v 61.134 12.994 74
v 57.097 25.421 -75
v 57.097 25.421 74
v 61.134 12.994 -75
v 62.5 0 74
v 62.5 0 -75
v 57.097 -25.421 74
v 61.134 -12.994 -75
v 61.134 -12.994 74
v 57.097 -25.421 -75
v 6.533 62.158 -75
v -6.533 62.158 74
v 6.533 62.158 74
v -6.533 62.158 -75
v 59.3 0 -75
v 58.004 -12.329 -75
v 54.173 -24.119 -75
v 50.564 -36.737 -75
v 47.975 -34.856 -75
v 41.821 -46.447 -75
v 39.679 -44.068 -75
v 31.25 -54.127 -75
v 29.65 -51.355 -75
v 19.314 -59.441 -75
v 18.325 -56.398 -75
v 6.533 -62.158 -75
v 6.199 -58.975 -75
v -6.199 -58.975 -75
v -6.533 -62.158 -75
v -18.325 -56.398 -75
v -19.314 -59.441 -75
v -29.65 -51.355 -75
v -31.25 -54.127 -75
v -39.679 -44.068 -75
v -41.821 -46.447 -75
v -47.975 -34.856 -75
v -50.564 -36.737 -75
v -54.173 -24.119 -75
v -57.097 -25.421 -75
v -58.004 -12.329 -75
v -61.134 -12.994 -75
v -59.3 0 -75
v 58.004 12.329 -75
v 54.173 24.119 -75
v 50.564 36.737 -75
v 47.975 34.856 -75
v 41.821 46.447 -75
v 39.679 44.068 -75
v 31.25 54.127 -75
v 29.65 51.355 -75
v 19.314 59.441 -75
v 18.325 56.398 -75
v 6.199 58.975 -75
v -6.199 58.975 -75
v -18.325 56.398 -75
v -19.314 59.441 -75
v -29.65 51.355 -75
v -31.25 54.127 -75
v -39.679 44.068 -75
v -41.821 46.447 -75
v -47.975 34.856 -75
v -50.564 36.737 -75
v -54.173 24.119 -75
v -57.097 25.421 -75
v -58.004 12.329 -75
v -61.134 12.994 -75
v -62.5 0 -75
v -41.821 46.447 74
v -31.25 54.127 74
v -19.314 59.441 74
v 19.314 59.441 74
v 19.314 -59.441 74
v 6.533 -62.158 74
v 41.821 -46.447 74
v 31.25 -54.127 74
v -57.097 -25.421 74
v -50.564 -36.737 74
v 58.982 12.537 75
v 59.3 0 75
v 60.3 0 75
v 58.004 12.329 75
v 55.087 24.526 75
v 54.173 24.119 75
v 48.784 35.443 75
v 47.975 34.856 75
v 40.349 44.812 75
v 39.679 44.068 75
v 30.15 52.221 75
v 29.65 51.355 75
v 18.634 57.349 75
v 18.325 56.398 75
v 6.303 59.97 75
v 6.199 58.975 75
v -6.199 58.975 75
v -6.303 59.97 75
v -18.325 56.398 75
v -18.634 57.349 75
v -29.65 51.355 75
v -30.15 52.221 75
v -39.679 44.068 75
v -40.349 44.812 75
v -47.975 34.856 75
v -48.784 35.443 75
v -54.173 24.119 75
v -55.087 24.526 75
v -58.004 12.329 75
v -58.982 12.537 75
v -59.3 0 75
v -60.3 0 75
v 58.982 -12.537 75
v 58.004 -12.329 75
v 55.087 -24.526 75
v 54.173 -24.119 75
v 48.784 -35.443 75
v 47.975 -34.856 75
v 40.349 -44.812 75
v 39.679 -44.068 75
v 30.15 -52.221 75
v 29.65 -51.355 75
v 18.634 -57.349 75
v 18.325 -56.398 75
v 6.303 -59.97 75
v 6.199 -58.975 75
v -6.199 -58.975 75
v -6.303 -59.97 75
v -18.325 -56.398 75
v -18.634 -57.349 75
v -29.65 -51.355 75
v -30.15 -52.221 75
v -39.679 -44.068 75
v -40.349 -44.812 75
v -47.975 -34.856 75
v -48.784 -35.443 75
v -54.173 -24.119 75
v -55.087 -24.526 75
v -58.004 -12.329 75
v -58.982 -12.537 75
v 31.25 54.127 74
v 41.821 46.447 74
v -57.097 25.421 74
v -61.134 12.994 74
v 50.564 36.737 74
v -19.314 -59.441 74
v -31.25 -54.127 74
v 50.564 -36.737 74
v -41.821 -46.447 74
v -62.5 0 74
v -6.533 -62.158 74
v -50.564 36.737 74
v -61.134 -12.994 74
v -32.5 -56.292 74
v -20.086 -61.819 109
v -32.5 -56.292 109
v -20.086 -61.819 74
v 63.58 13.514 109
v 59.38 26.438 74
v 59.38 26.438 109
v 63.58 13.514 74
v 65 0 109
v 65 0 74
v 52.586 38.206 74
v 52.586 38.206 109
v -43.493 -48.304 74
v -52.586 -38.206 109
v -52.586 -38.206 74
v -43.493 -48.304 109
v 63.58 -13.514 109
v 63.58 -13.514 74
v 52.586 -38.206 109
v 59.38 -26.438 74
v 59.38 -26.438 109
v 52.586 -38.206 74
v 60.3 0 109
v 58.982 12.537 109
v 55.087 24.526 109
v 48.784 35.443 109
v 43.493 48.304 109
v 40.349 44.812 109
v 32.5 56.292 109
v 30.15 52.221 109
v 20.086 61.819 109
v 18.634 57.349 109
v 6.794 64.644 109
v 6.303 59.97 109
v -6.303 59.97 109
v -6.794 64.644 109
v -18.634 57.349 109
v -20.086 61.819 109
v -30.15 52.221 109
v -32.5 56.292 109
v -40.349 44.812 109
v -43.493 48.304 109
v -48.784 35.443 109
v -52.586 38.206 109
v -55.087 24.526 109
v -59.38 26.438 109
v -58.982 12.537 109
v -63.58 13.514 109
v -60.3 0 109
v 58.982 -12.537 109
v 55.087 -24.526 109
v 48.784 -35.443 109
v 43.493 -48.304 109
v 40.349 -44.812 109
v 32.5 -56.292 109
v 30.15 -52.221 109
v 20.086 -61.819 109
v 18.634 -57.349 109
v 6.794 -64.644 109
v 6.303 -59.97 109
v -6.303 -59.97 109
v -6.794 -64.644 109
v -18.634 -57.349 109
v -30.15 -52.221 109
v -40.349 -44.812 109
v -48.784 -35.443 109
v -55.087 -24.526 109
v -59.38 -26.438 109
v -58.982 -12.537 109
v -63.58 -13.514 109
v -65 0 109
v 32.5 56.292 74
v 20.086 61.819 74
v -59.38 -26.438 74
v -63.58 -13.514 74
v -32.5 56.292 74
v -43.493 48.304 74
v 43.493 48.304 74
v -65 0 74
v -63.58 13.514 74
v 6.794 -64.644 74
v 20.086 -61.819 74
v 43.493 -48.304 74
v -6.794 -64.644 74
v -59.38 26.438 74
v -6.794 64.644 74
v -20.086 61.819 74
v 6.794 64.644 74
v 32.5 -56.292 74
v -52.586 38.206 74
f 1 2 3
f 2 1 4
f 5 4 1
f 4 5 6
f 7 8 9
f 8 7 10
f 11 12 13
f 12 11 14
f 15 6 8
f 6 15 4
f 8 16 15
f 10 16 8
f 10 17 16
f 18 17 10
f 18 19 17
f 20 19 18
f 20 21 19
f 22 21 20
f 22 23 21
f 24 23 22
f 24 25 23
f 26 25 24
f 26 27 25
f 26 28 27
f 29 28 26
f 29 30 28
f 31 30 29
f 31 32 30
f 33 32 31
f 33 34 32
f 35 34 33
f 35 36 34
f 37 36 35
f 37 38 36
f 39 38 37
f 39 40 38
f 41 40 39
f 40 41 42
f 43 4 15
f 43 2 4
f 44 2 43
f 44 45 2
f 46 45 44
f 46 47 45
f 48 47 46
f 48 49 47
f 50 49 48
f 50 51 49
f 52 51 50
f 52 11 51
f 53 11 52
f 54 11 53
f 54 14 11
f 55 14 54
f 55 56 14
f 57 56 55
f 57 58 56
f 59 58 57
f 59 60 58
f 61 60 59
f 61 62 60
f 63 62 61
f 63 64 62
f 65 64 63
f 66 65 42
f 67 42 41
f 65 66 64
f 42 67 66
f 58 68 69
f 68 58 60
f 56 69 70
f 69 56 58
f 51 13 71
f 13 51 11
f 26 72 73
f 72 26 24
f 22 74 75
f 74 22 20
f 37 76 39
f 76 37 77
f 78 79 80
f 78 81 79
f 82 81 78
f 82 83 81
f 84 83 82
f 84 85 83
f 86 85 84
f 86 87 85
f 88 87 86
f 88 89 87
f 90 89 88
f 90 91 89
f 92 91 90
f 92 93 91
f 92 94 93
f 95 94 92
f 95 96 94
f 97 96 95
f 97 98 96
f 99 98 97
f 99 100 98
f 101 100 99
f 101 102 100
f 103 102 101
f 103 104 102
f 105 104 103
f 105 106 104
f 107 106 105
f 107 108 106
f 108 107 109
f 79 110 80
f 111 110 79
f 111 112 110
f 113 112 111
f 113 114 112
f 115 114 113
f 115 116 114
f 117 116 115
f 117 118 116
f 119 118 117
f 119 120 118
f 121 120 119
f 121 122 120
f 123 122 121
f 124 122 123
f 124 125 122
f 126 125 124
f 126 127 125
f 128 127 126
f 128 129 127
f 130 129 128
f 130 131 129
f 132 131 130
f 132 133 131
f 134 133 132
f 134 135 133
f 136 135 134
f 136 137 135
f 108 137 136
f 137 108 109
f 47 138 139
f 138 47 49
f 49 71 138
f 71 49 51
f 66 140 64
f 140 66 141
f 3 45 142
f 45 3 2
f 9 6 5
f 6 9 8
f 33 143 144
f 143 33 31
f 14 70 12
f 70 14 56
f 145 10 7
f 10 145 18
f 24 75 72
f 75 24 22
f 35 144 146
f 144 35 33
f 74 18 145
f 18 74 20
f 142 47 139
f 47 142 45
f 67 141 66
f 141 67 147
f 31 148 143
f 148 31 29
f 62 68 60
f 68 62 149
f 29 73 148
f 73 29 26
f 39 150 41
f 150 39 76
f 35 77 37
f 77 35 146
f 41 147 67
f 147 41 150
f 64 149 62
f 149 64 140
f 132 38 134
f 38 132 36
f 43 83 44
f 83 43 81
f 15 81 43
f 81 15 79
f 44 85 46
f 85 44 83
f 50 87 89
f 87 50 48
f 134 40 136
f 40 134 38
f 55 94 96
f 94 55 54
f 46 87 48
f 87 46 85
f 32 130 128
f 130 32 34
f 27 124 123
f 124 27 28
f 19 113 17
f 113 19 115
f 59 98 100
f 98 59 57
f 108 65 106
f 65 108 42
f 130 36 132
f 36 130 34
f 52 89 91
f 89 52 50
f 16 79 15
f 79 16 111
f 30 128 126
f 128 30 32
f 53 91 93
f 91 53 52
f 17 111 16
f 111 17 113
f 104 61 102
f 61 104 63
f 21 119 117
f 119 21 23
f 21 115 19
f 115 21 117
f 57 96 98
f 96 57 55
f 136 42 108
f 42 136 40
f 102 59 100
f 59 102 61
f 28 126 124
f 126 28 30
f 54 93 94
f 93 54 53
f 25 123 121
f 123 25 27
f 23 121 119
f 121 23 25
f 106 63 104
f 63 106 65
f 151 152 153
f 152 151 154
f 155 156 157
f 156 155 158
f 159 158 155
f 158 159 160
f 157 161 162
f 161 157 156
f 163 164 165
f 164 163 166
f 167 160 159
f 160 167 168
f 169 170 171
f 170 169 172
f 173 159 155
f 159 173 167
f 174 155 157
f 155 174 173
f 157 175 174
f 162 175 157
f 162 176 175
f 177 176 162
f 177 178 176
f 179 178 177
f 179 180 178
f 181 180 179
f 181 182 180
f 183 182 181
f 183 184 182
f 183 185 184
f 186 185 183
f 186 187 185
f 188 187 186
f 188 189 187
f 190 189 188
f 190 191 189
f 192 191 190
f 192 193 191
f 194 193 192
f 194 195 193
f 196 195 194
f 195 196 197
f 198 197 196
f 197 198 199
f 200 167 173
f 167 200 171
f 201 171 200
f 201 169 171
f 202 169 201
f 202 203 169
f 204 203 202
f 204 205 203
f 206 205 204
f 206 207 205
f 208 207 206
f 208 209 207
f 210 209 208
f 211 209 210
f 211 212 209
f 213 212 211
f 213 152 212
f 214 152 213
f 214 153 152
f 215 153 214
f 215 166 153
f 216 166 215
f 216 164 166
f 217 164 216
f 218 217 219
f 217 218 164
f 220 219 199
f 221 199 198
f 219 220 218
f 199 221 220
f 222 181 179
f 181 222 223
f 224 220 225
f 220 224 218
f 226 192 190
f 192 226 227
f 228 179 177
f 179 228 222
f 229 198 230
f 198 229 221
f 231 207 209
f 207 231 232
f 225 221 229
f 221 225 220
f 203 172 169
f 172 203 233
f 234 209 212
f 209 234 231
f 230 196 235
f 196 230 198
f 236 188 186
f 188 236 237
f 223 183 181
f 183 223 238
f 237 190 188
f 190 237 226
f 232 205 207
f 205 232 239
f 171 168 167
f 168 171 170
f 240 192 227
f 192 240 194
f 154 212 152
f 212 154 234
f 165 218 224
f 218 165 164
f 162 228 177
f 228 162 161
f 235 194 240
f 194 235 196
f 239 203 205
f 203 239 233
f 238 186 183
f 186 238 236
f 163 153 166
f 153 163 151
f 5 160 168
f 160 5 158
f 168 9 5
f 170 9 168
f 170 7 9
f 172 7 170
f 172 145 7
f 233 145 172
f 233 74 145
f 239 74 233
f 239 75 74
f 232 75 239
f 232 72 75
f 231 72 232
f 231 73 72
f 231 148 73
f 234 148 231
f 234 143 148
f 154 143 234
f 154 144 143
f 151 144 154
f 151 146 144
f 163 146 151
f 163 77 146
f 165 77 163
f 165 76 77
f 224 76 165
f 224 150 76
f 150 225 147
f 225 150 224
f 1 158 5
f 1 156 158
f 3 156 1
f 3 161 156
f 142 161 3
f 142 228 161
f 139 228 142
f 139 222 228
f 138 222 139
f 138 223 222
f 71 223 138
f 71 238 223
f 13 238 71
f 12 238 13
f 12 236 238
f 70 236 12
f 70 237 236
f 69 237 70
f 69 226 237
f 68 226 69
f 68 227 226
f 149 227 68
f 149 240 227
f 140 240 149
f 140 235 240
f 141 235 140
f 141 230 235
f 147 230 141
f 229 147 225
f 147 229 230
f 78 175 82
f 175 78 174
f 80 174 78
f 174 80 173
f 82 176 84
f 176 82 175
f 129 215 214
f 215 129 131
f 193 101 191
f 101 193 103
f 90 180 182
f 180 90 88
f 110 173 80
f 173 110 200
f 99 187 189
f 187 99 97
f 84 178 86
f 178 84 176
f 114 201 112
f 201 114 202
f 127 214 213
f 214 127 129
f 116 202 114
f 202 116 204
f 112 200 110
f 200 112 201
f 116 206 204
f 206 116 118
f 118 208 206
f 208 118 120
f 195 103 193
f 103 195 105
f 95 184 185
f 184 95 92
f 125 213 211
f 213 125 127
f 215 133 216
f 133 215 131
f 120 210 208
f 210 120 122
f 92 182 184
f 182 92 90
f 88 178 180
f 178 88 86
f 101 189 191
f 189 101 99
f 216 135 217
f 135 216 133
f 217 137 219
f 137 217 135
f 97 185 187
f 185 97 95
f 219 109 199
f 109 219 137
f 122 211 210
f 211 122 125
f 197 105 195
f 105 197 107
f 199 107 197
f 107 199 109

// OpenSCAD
// Parameters
pipe_standard = 1; //[1:1:1]
nominal_diameter = 125; //[60:250:1]
length_mm = 150; //[75:300:1]
include_end_fitting = 1; //[0:1:1]
ht125_outer_diameter = 125; //[110:140:0.5]
ht125_wall_thickness = 3.2; //[2:6:0.1]
fit_overlap = 1; //[0.5:2:0.1]
fitting_length = 35; //[15:70:1]
fitting_wall_extra = 2.5; //[1:6:0.1]
fitting_bore_extra = 1.0; //[0:3:0.1]

// HT Pipe - complete geometry
module ht_pipe() {
  color([0.85, 0.85, 0.8]) {
    // Main pipe segment
    difference() {
      cylinder(r=ht125_outer_diameter/2, h=length_mm, center=true);
      translate([0, 0, -fit_overlap])
        cylinder(r=ht125_outer_diameter/2 - ht125_wall_thickness, h=length_mm + 2*fit_overlap, center=true);
    }
    
    // End fitting
    if (include_end_fitting) {
      difference() {
        translate([0, 0, length_mm/2 + fitting_length/2 - fit_overlap])
          cylinder(r=ht125_outer_diameter/2 + fitting_wall_extra, h=fitting_length, center=true);
        translate([0, 0, length_mm/2 + fitting_length/2 - fit_overlap])
          cylinder(r=ht125_outer_diameter/2 - ht125_wall_thickness + fitting_bore_extra, h=fitting_length + 2*fit_overlap, center=true);
      }
    }
  }
}

// Assembly
module assembly() {
  ht_pipe();
}

assembly();
